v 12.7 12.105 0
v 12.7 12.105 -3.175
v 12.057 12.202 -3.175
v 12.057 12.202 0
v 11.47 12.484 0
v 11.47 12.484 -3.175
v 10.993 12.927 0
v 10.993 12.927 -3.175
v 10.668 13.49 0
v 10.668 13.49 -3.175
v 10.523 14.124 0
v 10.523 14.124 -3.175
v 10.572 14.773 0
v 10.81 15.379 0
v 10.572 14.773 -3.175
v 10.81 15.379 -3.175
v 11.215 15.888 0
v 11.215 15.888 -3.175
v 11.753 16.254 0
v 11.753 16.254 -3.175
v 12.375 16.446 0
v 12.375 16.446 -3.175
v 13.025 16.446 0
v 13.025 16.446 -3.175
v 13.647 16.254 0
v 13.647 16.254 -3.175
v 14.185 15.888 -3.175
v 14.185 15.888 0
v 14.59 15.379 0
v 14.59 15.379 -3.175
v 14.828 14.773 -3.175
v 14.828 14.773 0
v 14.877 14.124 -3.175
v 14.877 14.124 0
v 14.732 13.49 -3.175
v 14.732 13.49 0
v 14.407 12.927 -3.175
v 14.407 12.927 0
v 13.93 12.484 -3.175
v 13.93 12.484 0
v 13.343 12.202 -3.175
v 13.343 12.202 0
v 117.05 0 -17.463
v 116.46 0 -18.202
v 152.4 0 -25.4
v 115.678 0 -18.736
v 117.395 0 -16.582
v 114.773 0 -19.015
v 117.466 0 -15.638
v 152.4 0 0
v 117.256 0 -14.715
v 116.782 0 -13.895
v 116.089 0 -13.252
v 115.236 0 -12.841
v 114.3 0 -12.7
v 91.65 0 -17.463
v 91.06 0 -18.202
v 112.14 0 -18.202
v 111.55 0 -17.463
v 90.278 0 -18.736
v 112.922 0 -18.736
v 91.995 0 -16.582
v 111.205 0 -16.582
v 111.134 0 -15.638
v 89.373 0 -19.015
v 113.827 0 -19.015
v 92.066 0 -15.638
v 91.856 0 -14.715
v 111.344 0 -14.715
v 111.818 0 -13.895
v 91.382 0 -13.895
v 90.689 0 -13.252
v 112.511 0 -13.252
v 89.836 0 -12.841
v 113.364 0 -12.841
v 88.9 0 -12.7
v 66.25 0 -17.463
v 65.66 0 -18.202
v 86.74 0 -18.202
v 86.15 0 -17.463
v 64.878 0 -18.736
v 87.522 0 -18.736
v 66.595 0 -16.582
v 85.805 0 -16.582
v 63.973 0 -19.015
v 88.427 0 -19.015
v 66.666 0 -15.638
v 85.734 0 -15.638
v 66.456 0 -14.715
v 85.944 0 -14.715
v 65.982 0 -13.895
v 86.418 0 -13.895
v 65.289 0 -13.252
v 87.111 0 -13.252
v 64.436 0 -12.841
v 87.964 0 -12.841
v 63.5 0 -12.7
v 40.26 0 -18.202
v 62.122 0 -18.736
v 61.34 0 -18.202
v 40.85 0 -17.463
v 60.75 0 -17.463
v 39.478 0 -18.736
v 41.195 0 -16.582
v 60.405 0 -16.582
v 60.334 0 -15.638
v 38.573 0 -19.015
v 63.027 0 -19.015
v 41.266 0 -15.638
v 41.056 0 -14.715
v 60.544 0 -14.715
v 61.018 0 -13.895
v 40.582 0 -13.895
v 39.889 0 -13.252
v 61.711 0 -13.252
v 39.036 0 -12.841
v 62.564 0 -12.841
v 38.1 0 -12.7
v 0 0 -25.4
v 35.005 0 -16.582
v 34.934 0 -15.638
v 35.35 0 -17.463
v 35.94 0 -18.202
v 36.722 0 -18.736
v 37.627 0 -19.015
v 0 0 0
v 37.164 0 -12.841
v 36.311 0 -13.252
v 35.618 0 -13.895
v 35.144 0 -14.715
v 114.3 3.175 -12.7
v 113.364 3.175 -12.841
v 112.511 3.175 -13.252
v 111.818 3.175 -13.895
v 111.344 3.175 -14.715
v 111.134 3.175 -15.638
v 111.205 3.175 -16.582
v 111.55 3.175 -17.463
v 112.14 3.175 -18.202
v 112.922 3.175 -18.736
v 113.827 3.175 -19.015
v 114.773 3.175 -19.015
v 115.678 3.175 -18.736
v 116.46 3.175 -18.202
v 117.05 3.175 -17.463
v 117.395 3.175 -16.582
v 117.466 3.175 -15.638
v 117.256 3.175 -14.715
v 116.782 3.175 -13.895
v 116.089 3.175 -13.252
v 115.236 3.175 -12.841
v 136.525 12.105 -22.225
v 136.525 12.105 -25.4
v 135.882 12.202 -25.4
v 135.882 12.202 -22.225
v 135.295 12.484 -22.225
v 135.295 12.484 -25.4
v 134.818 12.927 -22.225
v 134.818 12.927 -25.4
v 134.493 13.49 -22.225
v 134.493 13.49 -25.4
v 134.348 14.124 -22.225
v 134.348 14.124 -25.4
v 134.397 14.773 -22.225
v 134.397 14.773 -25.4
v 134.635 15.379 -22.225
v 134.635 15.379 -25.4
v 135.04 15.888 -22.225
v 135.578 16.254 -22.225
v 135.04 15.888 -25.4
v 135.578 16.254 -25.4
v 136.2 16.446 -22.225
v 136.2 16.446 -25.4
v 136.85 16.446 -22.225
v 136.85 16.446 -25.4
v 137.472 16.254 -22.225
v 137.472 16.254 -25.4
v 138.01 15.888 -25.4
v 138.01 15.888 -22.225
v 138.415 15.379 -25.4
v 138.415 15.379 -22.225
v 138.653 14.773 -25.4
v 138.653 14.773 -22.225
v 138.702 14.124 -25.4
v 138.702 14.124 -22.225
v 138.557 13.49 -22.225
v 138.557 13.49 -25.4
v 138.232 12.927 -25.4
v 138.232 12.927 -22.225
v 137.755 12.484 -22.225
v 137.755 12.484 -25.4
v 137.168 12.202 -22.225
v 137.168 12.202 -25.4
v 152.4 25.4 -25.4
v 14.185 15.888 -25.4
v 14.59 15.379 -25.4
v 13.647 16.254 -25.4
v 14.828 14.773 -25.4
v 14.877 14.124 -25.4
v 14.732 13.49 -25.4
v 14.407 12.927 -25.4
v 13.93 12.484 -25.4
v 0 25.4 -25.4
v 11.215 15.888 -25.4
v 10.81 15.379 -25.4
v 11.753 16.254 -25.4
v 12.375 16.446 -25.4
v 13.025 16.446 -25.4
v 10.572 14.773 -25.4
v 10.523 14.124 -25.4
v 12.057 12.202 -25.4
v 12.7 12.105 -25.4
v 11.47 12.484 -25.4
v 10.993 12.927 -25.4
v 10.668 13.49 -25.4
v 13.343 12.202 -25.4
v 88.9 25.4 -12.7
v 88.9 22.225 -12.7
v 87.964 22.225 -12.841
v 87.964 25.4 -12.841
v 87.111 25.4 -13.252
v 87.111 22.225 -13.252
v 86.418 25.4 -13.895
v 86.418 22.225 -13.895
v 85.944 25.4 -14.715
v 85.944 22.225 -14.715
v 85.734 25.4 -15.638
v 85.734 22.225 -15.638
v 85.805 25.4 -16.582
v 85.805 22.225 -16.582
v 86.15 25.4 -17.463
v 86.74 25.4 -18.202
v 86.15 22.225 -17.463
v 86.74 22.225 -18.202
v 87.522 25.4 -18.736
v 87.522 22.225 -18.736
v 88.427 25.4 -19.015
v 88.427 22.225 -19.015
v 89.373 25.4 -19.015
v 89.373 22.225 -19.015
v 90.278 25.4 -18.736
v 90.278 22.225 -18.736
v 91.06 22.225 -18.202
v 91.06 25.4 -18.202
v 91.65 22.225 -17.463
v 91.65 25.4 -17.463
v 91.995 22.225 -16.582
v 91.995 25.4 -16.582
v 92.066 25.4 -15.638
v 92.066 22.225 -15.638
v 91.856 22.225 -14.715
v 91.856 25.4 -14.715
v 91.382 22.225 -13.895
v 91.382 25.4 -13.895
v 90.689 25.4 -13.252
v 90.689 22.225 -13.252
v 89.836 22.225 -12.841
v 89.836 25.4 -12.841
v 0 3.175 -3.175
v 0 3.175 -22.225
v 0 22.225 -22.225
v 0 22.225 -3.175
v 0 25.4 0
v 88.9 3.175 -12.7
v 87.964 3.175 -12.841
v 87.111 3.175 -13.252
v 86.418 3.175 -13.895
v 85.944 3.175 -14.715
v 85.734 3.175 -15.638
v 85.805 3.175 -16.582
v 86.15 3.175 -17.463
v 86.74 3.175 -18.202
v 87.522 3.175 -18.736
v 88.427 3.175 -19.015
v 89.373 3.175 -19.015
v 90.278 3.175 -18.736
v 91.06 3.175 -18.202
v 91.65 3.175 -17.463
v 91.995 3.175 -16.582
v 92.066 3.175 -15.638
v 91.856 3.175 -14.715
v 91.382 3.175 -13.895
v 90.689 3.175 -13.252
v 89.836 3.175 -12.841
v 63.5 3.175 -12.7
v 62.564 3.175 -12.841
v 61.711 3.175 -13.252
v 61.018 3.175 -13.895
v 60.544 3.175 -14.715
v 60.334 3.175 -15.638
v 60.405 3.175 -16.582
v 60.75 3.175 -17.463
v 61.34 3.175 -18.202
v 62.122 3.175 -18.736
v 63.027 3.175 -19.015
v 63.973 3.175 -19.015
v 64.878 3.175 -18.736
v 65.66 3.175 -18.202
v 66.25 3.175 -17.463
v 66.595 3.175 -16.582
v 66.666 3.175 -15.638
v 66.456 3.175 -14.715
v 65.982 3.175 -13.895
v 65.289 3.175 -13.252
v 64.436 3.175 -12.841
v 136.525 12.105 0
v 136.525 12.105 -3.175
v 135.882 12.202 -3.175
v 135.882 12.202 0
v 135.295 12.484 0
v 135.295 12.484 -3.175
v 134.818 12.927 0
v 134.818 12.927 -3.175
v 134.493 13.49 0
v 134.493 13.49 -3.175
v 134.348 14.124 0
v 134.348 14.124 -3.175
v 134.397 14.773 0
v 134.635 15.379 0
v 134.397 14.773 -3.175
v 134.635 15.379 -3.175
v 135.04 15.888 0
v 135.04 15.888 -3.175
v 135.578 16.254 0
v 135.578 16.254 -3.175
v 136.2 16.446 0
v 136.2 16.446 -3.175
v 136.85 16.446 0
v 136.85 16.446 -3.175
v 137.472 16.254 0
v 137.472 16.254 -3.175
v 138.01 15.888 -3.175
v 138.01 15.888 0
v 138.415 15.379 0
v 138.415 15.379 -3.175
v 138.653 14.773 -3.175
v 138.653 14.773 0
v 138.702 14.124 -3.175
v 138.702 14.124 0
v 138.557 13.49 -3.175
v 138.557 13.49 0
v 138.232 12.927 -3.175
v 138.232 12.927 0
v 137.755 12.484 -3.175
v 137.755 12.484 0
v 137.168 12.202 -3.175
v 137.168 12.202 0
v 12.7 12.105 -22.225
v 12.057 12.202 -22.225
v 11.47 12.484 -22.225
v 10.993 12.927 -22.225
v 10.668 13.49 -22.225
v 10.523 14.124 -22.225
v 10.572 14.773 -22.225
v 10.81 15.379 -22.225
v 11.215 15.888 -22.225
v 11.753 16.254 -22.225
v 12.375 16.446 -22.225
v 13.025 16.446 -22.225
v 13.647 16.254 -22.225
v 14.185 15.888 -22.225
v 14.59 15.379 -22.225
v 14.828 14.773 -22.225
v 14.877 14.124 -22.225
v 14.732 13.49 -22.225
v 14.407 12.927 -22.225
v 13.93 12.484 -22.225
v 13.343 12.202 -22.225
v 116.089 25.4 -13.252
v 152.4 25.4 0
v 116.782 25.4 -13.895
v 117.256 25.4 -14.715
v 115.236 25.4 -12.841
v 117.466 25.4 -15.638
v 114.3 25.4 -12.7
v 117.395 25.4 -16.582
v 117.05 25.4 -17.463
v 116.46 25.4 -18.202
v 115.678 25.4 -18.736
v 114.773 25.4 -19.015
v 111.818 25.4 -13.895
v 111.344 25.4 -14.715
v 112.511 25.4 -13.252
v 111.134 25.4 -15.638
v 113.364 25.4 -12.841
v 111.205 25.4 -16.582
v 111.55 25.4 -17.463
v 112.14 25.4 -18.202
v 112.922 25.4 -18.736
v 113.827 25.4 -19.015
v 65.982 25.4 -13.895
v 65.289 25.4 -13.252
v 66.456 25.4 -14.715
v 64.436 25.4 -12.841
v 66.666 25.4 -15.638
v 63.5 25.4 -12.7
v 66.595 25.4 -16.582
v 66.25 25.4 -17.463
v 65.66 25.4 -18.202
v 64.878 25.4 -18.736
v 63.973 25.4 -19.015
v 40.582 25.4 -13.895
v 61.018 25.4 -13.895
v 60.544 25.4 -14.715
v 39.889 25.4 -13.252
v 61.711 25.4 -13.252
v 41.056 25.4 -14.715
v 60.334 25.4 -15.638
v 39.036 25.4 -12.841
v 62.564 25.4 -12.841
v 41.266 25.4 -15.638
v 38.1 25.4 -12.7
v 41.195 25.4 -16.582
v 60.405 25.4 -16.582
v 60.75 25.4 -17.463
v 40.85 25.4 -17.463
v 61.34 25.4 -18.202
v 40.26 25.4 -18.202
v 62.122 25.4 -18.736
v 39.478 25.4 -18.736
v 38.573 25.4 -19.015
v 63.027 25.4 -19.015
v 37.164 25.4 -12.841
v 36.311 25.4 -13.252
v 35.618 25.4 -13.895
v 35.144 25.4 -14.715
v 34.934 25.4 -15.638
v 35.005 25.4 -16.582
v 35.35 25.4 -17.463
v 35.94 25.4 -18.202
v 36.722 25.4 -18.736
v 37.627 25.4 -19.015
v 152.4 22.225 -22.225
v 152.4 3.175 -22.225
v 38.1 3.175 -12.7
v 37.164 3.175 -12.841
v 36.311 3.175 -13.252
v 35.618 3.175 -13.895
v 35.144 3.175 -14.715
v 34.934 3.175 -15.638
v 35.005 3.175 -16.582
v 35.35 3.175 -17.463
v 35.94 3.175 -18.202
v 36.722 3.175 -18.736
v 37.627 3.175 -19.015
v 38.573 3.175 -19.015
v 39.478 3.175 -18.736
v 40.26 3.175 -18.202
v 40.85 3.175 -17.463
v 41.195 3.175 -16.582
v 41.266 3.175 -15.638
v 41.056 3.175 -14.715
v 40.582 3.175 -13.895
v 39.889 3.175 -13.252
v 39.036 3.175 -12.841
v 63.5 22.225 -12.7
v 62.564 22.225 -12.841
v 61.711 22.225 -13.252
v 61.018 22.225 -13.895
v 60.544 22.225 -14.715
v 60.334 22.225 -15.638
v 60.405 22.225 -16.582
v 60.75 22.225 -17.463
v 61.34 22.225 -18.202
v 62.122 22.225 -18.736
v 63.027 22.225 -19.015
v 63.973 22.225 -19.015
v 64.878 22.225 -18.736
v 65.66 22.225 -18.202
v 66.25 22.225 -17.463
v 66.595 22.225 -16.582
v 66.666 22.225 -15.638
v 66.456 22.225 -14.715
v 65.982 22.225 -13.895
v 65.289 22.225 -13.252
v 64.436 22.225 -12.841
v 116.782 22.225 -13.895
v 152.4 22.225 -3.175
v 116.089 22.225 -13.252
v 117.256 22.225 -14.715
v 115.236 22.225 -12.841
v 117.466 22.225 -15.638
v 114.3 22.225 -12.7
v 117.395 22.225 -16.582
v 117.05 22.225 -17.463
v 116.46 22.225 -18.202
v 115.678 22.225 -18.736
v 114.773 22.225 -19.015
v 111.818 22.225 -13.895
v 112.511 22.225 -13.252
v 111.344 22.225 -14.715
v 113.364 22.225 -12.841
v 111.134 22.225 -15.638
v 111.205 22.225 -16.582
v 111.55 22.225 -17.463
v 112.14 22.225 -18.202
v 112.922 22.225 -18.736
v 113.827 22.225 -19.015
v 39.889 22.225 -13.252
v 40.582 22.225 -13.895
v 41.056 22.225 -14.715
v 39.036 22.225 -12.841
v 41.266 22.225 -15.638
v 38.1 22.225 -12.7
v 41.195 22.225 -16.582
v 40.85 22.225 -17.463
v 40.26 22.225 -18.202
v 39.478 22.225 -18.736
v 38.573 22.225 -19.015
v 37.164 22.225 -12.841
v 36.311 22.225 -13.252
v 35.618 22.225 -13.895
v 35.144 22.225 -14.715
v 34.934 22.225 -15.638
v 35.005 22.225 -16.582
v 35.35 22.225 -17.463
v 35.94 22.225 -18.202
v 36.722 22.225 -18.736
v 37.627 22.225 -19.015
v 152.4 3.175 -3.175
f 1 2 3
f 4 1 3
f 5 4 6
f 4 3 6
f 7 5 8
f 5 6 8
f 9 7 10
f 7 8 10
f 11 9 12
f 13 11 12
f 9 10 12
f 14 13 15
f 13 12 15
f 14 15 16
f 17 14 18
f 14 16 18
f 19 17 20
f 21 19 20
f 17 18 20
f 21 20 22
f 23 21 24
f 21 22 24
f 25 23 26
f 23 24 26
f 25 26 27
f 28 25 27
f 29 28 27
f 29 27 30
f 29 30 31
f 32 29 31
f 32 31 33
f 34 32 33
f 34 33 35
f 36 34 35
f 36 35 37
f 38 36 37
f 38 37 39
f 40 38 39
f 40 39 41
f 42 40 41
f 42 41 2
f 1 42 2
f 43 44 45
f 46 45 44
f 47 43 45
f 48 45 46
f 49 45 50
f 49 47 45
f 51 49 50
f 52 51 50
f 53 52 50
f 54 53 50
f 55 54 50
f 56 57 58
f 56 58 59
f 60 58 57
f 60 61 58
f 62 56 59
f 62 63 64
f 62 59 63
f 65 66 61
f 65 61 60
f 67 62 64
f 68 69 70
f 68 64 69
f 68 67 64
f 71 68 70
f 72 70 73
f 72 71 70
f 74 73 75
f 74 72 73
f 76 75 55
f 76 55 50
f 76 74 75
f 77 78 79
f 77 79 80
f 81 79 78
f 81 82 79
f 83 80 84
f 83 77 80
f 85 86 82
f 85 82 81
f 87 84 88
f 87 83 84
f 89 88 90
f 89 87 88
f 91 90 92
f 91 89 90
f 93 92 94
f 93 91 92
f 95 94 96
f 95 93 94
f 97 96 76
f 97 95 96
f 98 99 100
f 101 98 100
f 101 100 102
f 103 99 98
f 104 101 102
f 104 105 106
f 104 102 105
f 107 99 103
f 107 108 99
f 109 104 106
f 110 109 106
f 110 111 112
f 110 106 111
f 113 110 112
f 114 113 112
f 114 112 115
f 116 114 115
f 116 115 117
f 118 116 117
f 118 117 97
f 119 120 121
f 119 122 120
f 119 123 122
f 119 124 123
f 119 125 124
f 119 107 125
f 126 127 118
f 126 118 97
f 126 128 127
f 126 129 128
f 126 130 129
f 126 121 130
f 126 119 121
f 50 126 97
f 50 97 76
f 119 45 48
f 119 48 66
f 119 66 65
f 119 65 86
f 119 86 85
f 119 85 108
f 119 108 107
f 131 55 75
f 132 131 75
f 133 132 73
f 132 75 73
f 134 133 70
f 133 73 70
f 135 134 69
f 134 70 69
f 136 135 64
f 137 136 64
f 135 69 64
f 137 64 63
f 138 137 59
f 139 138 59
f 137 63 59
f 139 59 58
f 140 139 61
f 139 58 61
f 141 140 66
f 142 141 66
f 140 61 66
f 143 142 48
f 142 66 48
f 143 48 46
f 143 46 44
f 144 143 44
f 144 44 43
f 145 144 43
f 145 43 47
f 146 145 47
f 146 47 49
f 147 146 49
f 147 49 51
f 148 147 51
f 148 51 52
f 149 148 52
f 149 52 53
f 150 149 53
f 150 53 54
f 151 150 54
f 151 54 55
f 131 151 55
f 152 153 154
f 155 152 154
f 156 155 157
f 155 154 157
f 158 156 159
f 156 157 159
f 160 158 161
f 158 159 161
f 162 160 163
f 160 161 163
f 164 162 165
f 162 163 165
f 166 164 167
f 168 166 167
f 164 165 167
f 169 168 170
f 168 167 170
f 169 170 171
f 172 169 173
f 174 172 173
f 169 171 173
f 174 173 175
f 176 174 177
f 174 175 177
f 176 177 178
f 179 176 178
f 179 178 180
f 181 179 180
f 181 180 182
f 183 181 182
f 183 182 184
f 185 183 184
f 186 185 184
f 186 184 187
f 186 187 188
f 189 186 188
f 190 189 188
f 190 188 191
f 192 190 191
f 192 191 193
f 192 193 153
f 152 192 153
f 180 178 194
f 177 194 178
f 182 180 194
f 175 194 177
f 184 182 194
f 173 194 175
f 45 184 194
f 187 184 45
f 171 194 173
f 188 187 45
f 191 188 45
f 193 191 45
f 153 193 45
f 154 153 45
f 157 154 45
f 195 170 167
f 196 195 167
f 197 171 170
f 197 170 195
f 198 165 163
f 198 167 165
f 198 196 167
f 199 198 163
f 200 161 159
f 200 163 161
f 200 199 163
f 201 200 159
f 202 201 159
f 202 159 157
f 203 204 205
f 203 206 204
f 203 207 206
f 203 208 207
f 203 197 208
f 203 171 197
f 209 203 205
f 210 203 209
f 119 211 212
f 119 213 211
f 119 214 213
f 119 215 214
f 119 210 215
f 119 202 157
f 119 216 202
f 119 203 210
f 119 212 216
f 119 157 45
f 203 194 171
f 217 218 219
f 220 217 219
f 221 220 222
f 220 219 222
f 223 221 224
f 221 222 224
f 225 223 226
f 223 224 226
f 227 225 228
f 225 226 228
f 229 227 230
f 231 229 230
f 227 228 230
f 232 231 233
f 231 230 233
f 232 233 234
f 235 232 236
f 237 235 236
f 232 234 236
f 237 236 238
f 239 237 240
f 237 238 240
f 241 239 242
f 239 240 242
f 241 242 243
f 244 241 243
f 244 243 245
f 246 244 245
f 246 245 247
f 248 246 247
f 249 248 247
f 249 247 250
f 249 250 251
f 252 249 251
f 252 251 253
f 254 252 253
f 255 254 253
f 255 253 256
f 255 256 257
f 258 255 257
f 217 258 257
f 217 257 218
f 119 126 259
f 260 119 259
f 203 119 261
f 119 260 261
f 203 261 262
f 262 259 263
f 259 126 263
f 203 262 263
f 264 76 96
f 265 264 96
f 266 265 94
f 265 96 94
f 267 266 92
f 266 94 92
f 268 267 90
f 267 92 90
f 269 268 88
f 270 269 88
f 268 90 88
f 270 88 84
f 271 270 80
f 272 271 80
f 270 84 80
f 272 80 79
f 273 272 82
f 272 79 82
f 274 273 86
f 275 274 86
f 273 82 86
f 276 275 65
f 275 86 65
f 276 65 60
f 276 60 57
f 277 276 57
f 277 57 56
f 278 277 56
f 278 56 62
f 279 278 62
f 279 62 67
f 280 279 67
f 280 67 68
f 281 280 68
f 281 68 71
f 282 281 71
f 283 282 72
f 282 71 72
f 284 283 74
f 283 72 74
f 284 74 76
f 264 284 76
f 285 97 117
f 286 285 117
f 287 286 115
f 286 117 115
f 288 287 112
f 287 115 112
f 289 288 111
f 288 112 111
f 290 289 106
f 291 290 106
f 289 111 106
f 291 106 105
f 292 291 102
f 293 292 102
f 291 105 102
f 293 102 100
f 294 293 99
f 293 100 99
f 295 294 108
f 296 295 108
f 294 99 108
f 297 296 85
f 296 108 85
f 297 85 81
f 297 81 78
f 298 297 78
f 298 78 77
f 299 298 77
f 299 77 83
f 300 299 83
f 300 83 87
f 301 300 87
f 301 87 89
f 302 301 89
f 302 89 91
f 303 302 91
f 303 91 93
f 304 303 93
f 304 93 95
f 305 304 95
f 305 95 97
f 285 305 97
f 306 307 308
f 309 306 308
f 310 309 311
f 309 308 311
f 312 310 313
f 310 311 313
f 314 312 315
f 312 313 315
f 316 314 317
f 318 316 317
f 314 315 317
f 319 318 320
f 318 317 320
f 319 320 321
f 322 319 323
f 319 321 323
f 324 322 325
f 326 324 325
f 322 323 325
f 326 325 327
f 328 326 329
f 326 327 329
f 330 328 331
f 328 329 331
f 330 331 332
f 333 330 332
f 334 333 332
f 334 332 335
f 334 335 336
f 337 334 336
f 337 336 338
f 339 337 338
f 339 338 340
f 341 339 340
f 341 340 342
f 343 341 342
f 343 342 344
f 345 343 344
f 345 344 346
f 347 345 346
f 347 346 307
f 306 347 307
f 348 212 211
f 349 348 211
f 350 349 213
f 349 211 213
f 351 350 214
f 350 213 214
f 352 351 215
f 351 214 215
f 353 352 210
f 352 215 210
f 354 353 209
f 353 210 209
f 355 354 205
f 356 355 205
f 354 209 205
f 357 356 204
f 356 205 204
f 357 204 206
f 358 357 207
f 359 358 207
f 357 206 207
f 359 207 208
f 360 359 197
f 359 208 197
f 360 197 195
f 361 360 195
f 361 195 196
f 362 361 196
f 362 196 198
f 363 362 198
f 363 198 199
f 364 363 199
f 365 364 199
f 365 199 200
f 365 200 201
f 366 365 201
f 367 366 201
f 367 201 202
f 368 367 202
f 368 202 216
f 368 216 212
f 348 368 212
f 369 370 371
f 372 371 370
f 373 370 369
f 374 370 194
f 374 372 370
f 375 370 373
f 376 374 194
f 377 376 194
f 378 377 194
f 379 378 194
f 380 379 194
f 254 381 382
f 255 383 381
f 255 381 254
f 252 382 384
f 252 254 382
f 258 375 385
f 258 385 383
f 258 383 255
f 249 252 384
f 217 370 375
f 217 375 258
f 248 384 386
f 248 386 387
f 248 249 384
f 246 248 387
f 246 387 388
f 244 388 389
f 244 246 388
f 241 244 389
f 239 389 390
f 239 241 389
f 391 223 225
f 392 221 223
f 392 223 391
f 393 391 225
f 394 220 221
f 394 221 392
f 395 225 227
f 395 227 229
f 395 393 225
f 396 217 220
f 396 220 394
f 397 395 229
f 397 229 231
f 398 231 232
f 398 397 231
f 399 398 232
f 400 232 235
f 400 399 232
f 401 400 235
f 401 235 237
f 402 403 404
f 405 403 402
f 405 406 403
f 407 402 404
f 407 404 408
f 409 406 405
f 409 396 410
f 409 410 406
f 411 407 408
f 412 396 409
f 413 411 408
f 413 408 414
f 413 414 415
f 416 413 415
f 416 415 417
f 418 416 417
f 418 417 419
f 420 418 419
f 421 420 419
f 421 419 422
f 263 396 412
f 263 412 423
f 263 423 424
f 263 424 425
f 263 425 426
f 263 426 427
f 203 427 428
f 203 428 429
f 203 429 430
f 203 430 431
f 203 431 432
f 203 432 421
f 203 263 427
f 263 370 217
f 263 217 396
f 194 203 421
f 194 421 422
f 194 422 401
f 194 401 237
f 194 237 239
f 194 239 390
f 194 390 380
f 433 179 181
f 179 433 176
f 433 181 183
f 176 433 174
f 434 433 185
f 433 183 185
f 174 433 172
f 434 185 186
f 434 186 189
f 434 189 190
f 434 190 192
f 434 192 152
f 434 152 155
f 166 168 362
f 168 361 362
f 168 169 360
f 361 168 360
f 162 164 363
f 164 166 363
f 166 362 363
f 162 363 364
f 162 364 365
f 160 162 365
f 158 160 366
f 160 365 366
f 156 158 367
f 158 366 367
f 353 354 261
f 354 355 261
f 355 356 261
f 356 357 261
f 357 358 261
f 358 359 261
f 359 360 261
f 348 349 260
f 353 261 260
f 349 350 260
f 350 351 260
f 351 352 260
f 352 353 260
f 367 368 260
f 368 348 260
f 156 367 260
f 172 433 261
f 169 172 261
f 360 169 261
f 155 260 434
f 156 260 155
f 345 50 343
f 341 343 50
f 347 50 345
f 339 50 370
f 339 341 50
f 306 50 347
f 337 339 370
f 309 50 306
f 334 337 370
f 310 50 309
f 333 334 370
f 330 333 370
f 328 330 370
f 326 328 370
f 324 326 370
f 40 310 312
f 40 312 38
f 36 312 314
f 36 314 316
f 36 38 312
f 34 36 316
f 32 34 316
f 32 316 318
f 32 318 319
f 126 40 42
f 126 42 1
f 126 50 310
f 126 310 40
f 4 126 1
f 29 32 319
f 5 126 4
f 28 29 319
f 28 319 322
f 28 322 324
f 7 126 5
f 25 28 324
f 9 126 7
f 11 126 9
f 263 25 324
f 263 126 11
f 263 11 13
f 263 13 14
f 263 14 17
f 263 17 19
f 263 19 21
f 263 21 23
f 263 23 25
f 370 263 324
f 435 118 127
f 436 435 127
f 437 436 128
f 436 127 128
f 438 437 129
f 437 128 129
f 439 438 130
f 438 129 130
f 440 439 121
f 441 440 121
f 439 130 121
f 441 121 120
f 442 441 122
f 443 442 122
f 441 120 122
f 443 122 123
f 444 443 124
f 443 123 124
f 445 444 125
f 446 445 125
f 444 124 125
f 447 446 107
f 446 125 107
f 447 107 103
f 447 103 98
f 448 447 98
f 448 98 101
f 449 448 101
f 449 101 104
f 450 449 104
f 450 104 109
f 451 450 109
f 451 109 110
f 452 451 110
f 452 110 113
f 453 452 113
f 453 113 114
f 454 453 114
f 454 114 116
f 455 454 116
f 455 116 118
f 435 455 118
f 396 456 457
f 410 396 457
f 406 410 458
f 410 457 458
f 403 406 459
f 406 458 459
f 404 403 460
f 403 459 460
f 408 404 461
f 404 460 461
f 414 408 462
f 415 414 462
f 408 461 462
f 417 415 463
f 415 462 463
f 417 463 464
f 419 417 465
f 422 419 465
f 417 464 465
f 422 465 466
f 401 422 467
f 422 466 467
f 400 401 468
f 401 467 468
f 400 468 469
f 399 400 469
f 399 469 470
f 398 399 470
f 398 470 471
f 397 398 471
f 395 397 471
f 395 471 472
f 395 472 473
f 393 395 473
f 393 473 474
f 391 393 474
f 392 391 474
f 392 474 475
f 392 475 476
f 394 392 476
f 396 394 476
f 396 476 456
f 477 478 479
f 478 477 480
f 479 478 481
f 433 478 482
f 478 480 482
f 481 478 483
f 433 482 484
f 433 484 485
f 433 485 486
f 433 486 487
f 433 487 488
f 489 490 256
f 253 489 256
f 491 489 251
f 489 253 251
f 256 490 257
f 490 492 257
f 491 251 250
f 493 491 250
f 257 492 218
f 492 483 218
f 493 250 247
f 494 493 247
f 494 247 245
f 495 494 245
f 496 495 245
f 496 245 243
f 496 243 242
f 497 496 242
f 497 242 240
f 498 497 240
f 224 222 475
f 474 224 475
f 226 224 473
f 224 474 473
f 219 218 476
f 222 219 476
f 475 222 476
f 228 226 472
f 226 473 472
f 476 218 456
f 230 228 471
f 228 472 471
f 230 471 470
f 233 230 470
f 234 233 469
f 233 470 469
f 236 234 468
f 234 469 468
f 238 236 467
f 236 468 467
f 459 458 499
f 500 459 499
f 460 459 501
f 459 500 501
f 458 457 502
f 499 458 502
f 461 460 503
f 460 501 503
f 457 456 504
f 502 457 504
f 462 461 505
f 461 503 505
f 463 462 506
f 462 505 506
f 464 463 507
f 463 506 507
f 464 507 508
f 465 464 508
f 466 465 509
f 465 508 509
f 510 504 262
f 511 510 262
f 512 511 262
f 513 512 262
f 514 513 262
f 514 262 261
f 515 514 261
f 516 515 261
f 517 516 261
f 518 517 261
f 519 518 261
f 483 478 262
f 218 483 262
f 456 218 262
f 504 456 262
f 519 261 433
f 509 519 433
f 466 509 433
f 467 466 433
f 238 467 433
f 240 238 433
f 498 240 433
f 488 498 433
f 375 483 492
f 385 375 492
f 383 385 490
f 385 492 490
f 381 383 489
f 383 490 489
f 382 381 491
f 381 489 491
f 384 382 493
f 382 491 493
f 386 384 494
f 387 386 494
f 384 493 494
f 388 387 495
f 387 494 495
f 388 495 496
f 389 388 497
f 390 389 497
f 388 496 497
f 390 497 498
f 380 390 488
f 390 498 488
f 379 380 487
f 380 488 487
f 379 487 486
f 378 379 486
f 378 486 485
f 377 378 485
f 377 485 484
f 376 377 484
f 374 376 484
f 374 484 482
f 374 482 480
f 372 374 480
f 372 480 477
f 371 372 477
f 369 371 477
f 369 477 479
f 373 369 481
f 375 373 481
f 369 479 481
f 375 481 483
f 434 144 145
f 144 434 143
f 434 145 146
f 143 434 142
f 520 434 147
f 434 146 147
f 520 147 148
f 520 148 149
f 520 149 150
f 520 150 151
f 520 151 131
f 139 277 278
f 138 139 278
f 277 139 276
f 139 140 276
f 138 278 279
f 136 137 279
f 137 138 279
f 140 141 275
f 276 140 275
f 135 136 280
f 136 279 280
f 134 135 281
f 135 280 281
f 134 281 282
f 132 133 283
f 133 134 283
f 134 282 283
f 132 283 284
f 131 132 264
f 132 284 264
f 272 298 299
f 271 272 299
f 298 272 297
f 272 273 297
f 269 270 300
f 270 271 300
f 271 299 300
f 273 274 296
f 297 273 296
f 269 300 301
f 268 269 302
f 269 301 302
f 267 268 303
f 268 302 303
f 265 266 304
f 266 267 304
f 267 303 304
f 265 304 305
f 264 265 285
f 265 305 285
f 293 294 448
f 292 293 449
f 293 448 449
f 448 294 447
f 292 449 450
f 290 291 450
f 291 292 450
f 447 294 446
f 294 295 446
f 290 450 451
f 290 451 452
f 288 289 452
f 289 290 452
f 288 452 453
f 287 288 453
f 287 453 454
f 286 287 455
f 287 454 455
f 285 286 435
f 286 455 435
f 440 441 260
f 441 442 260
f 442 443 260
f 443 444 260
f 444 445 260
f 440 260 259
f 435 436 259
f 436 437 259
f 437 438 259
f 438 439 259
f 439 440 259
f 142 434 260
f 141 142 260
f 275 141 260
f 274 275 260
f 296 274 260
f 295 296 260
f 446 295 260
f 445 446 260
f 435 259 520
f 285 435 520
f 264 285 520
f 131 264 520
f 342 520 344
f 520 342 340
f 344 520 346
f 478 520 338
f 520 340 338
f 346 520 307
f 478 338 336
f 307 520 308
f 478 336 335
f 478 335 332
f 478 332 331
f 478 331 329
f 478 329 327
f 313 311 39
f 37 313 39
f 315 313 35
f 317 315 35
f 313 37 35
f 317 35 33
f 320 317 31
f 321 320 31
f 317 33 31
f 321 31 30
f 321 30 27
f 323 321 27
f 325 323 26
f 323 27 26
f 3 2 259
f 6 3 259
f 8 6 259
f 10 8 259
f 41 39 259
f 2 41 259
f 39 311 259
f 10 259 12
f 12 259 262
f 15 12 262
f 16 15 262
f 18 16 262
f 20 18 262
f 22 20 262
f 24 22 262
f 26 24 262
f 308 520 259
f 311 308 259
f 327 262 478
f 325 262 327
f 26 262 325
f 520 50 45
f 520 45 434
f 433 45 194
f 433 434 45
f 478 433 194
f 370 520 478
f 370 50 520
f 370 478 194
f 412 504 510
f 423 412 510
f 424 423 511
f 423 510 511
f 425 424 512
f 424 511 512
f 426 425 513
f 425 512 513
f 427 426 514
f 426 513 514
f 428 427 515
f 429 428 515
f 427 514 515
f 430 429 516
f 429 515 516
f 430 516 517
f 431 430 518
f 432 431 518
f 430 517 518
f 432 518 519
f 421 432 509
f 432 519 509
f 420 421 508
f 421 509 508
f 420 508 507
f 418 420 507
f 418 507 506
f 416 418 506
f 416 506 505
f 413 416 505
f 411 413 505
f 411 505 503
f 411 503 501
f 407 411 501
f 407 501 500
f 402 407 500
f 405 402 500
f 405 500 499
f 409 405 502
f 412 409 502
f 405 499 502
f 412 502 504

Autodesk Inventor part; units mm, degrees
ref_plane "YZ Plane" through (0, 0, 0) normal (1, 0, 0) x (0, 1, 0)
ref_plane "XZ Plane" through (0, 0, 0) normal (0, 1, 0) x (-1, 0, 0)
ref_plane "XY Plane" through (0, 0, 0) normal (0, 0, 1) x (1, 0, 0)
sketch "Sketch1" plane through (0, 0, 0) normal (1, 0, 0) x (0, 1, 0)
  line L0 (0, 0) -> (25.4, 0)
  line L1 (25.4, 0) -> (25.4, -25.4)
  line L2 (25.4, -25.4) -> (0, -25.4)
  line L3 (0, -25.4) -> (0, 0)
  line L4 (3.175, -3.175) -> (22.225, -3.175)
  line L5 (22.225, -3.175) -> (22.225, -22.225)
  line L6 (22.225, -22.225) -> (3.175, -22.225)
  line L7 (3.175, -22.225) -> (3.175, -3.175)
  dimension "d0" = 25.4
  dimension "d1" = 25.4
  dimension "d2" = 19.05
  dimension "d3" = 19.05
  dimension "d4" = 3.175
  dimension "d5" = 3.175
extrude "Extrusion1" add sketch "Sketch1" along normal blind 152.4
sketch "Sketch2" plane through (0, 25.4, 0) normal (0, 1, 0) x (1, 0, 0)
  line L0 (0, 0) -> (0, 25.4) projected
  line L1 (0, 0) -> (152.4, 0) projected
  line L2 (152.4, 25.4) -> (152.4, 0) projected
  point P0 (38.1, 15.875)
  point P1 (114.3, 15.875)
  dimension "d8" = 38.1
  dimension "d9" = 15.875
  dimension "d10" = 15.875
  dimension "d11" = 38.1
hole "Hole1" at (38.1, 25.4, -15.875) at (114.3, 25.4, -15.875) direction (0, -1, 0) diameter 6.35 end through all
sketch "Sketch3" plane through (0, 0, 0) normal (0, 0, 1) x (1, 0, 0)
  line L0 (0, 0) -> (0, 25.4) projected
  line L1 (0, 0) -> (152.4, 0) projected
  line L2 (152.4, 25.4) -> (152.4, 0) projected
  point P0 (12.7, 14.2875)
  point P1 (136.525, 14.2875)
  dimension "d19" = 15.875
  dimension "d20" = 14.2875
  dimension "d21" = 12.7
  dimension "d22" = 14.2875
hole "Hole2" at (12.7, 14.2875, 0) at (136.525, 14.2875, 0) direction (0, 0, -1) diameter 4.3656 end through all
sketch "Sketch4" plane through (0, 25.4, 0) normal (0, 1, 0) x (1, 0, 0)
  line L0 (0, 0) -> (152.4, 0) projected
  line L1 (0, 0) -> (0, 25.4) projected
  point P0 (63.5, 15.875)
  dimension "d30" = 15.875
  dimension "d39" = 63.5
hole "Hole3" at (63.5, 25.4, -15.875) direction (0, -1, 0) diameter 6.35 end through all
sketch "Sketch5" plane through (0, 25.4, 0) normal (0, 1, 0) x (1, 0, 0)
  circle A0 centre (114.3, 15.875) radius 3.175 projected
  line L0 (0, 25.4) -> (152.4, 25.4) projected
  point P0 (88.9, 15.875)
  dimension "d40" = 9.525
  dimension "d41" = 25.4
hole "Hole4" at (88.9, 25.4, -15.875) direction (0, -1, 0) diameter 6.35 depth 25.4 tip angle 118
properties part number "1x1 pickup arm support rear" material "Aluminum 6061"
